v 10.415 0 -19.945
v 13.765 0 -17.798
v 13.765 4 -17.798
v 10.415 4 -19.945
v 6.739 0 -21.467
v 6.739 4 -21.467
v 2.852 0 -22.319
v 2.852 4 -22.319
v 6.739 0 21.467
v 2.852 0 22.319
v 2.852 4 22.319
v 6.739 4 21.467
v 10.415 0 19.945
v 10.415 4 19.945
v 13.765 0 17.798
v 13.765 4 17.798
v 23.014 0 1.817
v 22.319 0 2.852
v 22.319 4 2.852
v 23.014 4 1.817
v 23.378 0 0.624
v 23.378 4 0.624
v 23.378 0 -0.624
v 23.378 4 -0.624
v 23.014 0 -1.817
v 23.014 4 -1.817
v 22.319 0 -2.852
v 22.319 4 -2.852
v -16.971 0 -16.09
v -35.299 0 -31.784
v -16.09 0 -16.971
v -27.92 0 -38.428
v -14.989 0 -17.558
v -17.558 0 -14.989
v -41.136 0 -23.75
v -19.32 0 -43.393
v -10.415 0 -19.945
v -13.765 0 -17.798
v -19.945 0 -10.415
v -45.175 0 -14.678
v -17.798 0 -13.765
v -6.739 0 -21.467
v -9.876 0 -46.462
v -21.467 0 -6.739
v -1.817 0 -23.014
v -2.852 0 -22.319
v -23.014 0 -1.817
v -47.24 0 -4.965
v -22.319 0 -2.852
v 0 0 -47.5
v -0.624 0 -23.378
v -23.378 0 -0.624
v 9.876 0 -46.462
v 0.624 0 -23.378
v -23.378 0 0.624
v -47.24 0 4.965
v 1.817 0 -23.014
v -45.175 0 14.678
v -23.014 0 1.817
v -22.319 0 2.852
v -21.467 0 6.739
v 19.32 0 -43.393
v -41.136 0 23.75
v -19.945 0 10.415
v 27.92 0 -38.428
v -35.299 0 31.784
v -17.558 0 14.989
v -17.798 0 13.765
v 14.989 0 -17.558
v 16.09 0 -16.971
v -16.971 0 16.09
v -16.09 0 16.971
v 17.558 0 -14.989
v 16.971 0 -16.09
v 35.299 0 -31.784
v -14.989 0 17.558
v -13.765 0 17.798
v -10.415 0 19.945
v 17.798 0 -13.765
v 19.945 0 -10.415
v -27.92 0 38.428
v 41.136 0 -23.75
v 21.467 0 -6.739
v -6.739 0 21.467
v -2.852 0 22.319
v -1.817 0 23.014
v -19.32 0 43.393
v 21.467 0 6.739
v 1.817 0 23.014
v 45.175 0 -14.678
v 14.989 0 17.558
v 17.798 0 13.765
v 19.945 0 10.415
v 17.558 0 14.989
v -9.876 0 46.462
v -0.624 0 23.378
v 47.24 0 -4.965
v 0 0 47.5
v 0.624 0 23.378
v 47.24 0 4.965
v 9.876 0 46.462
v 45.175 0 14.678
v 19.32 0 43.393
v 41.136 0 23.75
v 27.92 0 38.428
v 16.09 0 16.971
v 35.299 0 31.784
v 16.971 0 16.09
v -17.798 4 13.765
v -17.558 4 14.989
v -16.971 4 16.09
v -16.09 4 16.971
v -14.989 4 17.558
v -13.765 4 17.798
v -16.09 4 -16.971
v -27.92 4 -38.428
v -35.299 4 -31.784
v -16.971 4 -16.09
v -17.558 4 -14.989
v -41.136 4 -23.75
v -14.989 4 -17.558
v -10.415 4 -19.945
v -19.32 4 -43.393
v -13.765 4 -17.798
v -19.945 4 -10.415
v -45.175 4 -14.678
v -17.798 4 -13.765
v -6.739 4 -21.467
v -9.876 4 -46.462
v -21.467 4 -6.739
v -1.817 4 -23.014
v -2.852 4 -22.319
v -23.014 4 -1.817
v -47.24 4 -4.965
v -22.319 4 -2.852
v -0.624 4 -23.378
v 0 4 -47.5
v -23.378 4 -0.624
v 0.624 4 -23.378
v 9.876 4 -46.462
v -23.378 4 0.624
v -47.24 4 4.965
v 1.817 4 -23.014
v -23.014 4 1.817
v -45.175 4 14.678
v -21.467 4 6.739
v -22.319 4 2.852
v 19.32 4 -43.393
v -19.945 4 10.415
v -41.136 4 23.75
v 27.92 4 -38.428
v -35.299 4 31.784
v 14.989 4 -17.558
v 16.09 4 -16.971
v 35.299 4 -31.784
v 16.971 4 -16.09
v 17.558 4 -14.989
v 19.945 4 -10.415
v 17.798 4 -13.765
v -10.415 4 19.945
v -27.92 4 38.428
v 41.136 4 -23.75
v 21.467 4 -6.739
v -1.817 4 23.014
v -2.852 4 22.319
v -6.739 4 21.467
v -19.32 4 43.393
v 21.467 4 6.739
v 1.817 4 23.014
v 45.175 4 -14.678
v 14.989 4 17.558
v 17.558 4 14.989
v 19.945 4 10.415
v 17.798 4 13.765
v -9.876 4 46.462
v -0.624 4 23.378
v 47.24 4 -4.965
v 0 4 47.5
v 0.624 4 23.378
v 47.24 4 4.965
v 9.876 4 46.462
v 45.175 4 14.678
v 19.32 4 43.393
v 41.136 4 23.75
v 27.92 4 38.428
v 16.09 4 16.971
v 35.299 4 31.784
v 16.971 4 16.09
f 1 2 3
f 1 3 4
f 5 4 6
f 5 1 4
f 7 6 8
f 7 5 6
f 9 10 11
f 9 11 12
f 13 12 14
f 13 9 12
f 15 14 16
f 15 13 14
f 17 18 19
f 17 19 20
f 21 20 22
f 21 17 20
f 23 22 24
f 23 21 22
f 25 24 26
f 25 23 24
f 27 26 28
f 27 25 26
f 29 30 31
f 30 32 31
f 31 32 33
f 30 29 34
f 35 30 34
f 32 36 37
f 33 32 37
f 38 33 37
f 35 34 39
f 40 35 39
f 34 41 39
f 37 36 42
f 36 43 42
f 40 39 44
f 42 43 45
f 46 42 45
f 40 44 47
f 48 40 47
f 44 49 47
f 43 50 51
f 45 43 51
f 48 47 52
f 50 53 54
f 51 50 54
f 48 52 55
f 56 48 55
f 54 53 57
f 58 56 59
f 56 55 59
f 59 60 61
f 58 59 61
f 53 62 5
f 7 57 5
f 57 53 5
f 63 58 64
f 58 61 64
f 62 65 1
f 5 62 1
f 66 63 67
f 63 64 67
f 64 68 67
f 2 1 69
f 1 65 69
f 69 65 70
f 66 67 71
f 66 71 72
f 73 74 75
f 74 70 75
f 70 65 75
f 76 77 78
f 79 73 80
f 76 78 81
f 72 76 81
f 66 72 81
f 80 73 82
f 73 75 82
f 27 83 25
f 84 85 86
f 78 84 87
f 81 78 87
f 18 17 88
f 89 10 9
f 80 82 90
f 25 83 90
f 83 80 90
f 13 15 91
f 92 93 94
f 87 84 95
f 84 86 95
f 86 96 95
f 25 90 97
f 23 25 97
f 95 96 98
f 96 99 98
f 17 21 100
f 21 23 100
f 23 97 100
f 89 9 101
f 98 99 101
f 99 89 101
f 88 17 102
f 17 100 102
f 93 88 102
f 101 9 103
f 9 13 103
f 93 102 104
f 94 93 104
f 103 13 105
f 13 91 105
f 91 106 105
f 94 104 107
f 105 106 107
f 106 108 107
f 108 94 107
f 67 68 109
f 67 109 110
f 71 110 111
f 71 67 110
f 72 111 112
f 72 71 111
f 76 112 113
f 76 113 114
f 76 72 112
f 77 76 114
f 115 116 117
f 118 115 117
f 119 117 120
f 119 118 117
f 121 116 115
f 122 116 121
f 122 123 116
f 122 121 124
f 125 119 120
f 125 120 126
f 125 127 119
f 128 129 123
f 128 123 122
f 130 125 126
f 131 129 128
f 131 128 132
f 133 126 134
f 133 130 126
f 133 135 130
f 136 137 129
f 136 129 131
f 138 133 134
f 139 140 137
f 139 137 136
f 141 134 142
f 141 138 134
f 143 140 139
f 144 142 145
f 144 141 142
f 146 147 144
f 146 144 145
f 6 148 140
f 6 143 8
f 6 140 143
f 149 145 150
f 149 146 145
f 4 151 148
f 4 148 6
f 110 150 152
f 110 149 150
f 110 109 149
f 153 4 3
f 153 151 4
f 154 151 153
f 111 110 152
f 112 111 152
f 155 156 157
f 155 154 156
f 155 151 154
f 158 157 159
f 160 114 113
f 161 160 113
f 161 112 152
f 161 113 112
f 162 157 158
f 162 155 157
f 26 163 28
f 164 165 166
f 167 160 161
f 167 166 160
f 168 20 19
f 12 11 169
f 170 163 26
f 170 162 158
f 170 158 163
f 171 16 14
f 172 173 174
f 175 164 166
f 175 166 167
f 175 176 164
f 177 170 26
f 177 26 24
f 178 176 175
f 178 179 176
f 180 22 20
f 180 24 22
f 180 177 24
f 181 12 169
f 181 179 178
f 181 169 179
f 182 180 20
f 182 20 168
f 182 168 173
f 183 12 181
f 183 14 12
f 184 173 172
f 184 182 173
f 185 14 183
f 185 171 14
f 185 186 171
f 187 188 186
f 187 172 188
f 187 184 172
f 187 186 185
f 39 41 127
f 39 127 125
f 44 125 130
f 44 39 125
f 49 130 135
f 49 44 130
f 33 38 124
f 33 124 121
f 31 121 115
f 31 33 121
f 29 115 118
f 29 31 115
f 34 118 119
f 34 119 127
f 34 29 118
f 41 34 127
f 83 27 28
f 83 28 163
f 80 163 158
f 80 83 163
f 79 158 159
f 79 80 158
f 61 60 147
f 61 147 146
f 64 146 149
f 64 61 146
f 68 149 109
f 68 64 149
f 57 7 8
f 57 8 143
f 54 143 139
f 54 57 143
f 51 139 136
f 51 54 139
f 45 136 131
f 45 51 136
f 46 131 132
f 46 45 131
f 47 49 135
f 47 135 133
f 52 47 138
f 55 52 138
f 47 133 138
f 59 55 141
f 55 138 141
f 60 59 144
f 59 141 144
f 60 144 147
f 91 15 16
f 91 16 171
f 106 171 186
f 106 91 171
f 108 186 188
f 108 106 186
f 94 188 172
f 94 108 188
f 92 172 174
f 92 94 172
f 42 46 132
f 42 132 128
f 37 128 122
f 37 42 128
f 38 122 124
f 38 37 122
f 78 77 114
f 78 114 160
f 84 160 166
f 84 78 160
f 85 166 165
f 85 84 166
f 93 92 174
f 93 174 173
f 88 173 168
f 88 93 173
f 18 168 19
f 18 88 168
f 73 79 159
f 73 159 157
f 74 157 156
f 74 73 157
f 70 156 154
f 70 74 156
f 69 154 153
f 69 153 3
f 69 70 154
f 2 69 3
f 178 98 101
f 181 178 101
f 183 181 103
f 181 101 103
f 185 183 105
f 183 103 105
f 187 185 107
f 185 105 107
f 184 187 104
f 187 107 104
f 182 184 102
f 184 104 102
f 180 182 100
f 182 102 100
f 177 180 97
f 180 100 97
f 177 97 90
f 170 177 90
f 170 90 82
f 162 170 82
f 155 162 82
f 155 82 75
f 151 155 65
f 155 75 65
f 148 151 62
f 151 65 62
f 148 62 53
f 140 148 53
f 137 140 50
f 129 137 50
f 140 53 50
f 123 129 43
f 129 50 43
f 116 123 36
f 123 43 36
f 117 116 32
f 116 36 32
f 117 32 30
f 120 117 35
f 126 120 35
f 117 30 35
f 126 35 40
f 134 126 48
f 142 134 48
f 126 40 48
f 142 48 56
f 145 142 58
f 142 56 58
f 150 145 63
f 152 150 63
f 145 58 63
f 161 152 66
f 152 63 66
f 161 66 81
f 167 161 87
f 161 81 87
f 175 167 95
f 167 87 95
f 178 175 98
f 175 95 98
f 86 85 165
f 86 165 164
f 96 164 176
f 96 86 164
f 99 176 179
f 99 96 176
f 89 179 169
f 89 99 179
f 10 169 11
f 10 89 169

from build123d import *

# Parameters (mm, degrees)
SKETCH1_R           = 47.5
BOSS_EXTRUDE1_DEPTH = 4
SKETCH2_R           = 22.5
CUT_EXTRUDE1_DEPTH  = 68.294130502
SKETCH3_R           = 4.231561453
CUT_EXTRUDE2_DEPTH  = 4
CIRPATTERN1_DEPTH   = 4


# Read off the part's stored shape, not the designer's step: CirPattern1
with BuildPart() as part:
    # Sketch1 → Boss-Extrude1 (new body)
    with BuildSketch(Plane(origin=(0, 0, 0), x_dir=(1, 0, 0), z_dir=(0, 1, 0))):
        with Locations(Location((0, 0, 0), (0, 0, 270))):
            Circle(SKETCH1_R)
    extrude(amount=BOSS_EXTRUDE1_DEPTH)

    # Sketch2 → Cut-Extrude1 (cut, through all)
    with BuildSketch(Plane(origin=(0, 0, 0), x_dir=(1, 0, 0), z_dir=(0, 1, 0))):
        with Locations(Location((0, 0, 0), (0, 0, 270))):
            Circle(SKETCH2_R)
    extrude(amount=CUT_EXTRUDE1_DEPTH, mode=Mode.SUBTRACT)

    # Sketch3 → Cut-Extrude2 (cut)
    with BuildSketch(Plane(origin=(0, 4, 0), x_dir=(1, 0, 0), z_dir=(0, 1, 0))):
        with Locations((-19.192330033, 0)):
            Circle(SKETCH3_R)
    extrude(amount=-CUT_EXTRUDE2_DEPTH, mode=Mode.SUBTRACT)

    # CirPattern1 outline → CirPattern1 (cut)
    with BuildSketch(Plane(origin=(0, 0, 0), x_dir=(1, 0, 0), z_dir=(0, 1, 0))):
        with BuildLine():
            ThreePointArc((-13.765038141, -17.798138245), (-15.909902577, -15.909902577), (-17.798138245, -13.765038141))
            ThreePointArc((-17.798138245, -13.765038141), (-16.563192512, -16.563192512), (-13.765038141, -17.798138245))
        make_face()
        with BuildLine():
            ThreePointArc((-17.798138245, 13.765038141), (-15.909902577, 15.909902577), (-13.765038141, 17.798138245))
            ThreePointArc((-13.765038141, 17.798138245), (-16.563192512, 16.563192512), (-17.798138245, 13.765038141))
        make_face()
        with BuildLine():
            ThreePointArc((-2.851832433, 22.318536059), (0, 22.500000001), (2.851832433, 22.318536059))
            ThreePointArc((2.851832433, 22.318536059), (0, 23.423891487), (-2.851832433, 22.318536059))
        make_face()
        with BuildLine():
            ThreePointArc((13.765038141, 17.798138245), (15.909902577, 15.909902577), (17.798138245, 13.765038141))
            ThreePointArc((17.798138245, 13.765038141), (16.563192512, 16.563192512), (13.765038141, 17.798138245))
        make_face()
        with BuildLine():
            ThreePointArc((22.318536058, 2.851832433), (22.5, 0), (22.318536058, -2.851832433))
            ThreePointArc((22.318536058, -2.851832433), (23.423891487, 0), (22.318536058, 2.851832433))
        make_face()
        with BuildLine():
            ThreePointArc((17.798138245, -13.765038141), (15.909902576, -15.909902576), (13.765038141, -17.798138244))
            ThreePointArc((13.765038141, -17.798138244), (16.563192512, -16.563192512), (17.798138245, -13.765038141))
        make_face()
        with BuildLine():
            ThreePointArc((2.851832433, -22.318536058), (0, -22.499999999), (-2.851832433, -22.318536058))
            ThreePointArc((-2.851832433, -22.318536058), (0, -23.423891487), (2.851832433, -22.318536058))
        make_face()
    extrude(amount=CIRPATTERN1_DEPTH, mode=Mode.SUBTRACT)


solid = part.part
